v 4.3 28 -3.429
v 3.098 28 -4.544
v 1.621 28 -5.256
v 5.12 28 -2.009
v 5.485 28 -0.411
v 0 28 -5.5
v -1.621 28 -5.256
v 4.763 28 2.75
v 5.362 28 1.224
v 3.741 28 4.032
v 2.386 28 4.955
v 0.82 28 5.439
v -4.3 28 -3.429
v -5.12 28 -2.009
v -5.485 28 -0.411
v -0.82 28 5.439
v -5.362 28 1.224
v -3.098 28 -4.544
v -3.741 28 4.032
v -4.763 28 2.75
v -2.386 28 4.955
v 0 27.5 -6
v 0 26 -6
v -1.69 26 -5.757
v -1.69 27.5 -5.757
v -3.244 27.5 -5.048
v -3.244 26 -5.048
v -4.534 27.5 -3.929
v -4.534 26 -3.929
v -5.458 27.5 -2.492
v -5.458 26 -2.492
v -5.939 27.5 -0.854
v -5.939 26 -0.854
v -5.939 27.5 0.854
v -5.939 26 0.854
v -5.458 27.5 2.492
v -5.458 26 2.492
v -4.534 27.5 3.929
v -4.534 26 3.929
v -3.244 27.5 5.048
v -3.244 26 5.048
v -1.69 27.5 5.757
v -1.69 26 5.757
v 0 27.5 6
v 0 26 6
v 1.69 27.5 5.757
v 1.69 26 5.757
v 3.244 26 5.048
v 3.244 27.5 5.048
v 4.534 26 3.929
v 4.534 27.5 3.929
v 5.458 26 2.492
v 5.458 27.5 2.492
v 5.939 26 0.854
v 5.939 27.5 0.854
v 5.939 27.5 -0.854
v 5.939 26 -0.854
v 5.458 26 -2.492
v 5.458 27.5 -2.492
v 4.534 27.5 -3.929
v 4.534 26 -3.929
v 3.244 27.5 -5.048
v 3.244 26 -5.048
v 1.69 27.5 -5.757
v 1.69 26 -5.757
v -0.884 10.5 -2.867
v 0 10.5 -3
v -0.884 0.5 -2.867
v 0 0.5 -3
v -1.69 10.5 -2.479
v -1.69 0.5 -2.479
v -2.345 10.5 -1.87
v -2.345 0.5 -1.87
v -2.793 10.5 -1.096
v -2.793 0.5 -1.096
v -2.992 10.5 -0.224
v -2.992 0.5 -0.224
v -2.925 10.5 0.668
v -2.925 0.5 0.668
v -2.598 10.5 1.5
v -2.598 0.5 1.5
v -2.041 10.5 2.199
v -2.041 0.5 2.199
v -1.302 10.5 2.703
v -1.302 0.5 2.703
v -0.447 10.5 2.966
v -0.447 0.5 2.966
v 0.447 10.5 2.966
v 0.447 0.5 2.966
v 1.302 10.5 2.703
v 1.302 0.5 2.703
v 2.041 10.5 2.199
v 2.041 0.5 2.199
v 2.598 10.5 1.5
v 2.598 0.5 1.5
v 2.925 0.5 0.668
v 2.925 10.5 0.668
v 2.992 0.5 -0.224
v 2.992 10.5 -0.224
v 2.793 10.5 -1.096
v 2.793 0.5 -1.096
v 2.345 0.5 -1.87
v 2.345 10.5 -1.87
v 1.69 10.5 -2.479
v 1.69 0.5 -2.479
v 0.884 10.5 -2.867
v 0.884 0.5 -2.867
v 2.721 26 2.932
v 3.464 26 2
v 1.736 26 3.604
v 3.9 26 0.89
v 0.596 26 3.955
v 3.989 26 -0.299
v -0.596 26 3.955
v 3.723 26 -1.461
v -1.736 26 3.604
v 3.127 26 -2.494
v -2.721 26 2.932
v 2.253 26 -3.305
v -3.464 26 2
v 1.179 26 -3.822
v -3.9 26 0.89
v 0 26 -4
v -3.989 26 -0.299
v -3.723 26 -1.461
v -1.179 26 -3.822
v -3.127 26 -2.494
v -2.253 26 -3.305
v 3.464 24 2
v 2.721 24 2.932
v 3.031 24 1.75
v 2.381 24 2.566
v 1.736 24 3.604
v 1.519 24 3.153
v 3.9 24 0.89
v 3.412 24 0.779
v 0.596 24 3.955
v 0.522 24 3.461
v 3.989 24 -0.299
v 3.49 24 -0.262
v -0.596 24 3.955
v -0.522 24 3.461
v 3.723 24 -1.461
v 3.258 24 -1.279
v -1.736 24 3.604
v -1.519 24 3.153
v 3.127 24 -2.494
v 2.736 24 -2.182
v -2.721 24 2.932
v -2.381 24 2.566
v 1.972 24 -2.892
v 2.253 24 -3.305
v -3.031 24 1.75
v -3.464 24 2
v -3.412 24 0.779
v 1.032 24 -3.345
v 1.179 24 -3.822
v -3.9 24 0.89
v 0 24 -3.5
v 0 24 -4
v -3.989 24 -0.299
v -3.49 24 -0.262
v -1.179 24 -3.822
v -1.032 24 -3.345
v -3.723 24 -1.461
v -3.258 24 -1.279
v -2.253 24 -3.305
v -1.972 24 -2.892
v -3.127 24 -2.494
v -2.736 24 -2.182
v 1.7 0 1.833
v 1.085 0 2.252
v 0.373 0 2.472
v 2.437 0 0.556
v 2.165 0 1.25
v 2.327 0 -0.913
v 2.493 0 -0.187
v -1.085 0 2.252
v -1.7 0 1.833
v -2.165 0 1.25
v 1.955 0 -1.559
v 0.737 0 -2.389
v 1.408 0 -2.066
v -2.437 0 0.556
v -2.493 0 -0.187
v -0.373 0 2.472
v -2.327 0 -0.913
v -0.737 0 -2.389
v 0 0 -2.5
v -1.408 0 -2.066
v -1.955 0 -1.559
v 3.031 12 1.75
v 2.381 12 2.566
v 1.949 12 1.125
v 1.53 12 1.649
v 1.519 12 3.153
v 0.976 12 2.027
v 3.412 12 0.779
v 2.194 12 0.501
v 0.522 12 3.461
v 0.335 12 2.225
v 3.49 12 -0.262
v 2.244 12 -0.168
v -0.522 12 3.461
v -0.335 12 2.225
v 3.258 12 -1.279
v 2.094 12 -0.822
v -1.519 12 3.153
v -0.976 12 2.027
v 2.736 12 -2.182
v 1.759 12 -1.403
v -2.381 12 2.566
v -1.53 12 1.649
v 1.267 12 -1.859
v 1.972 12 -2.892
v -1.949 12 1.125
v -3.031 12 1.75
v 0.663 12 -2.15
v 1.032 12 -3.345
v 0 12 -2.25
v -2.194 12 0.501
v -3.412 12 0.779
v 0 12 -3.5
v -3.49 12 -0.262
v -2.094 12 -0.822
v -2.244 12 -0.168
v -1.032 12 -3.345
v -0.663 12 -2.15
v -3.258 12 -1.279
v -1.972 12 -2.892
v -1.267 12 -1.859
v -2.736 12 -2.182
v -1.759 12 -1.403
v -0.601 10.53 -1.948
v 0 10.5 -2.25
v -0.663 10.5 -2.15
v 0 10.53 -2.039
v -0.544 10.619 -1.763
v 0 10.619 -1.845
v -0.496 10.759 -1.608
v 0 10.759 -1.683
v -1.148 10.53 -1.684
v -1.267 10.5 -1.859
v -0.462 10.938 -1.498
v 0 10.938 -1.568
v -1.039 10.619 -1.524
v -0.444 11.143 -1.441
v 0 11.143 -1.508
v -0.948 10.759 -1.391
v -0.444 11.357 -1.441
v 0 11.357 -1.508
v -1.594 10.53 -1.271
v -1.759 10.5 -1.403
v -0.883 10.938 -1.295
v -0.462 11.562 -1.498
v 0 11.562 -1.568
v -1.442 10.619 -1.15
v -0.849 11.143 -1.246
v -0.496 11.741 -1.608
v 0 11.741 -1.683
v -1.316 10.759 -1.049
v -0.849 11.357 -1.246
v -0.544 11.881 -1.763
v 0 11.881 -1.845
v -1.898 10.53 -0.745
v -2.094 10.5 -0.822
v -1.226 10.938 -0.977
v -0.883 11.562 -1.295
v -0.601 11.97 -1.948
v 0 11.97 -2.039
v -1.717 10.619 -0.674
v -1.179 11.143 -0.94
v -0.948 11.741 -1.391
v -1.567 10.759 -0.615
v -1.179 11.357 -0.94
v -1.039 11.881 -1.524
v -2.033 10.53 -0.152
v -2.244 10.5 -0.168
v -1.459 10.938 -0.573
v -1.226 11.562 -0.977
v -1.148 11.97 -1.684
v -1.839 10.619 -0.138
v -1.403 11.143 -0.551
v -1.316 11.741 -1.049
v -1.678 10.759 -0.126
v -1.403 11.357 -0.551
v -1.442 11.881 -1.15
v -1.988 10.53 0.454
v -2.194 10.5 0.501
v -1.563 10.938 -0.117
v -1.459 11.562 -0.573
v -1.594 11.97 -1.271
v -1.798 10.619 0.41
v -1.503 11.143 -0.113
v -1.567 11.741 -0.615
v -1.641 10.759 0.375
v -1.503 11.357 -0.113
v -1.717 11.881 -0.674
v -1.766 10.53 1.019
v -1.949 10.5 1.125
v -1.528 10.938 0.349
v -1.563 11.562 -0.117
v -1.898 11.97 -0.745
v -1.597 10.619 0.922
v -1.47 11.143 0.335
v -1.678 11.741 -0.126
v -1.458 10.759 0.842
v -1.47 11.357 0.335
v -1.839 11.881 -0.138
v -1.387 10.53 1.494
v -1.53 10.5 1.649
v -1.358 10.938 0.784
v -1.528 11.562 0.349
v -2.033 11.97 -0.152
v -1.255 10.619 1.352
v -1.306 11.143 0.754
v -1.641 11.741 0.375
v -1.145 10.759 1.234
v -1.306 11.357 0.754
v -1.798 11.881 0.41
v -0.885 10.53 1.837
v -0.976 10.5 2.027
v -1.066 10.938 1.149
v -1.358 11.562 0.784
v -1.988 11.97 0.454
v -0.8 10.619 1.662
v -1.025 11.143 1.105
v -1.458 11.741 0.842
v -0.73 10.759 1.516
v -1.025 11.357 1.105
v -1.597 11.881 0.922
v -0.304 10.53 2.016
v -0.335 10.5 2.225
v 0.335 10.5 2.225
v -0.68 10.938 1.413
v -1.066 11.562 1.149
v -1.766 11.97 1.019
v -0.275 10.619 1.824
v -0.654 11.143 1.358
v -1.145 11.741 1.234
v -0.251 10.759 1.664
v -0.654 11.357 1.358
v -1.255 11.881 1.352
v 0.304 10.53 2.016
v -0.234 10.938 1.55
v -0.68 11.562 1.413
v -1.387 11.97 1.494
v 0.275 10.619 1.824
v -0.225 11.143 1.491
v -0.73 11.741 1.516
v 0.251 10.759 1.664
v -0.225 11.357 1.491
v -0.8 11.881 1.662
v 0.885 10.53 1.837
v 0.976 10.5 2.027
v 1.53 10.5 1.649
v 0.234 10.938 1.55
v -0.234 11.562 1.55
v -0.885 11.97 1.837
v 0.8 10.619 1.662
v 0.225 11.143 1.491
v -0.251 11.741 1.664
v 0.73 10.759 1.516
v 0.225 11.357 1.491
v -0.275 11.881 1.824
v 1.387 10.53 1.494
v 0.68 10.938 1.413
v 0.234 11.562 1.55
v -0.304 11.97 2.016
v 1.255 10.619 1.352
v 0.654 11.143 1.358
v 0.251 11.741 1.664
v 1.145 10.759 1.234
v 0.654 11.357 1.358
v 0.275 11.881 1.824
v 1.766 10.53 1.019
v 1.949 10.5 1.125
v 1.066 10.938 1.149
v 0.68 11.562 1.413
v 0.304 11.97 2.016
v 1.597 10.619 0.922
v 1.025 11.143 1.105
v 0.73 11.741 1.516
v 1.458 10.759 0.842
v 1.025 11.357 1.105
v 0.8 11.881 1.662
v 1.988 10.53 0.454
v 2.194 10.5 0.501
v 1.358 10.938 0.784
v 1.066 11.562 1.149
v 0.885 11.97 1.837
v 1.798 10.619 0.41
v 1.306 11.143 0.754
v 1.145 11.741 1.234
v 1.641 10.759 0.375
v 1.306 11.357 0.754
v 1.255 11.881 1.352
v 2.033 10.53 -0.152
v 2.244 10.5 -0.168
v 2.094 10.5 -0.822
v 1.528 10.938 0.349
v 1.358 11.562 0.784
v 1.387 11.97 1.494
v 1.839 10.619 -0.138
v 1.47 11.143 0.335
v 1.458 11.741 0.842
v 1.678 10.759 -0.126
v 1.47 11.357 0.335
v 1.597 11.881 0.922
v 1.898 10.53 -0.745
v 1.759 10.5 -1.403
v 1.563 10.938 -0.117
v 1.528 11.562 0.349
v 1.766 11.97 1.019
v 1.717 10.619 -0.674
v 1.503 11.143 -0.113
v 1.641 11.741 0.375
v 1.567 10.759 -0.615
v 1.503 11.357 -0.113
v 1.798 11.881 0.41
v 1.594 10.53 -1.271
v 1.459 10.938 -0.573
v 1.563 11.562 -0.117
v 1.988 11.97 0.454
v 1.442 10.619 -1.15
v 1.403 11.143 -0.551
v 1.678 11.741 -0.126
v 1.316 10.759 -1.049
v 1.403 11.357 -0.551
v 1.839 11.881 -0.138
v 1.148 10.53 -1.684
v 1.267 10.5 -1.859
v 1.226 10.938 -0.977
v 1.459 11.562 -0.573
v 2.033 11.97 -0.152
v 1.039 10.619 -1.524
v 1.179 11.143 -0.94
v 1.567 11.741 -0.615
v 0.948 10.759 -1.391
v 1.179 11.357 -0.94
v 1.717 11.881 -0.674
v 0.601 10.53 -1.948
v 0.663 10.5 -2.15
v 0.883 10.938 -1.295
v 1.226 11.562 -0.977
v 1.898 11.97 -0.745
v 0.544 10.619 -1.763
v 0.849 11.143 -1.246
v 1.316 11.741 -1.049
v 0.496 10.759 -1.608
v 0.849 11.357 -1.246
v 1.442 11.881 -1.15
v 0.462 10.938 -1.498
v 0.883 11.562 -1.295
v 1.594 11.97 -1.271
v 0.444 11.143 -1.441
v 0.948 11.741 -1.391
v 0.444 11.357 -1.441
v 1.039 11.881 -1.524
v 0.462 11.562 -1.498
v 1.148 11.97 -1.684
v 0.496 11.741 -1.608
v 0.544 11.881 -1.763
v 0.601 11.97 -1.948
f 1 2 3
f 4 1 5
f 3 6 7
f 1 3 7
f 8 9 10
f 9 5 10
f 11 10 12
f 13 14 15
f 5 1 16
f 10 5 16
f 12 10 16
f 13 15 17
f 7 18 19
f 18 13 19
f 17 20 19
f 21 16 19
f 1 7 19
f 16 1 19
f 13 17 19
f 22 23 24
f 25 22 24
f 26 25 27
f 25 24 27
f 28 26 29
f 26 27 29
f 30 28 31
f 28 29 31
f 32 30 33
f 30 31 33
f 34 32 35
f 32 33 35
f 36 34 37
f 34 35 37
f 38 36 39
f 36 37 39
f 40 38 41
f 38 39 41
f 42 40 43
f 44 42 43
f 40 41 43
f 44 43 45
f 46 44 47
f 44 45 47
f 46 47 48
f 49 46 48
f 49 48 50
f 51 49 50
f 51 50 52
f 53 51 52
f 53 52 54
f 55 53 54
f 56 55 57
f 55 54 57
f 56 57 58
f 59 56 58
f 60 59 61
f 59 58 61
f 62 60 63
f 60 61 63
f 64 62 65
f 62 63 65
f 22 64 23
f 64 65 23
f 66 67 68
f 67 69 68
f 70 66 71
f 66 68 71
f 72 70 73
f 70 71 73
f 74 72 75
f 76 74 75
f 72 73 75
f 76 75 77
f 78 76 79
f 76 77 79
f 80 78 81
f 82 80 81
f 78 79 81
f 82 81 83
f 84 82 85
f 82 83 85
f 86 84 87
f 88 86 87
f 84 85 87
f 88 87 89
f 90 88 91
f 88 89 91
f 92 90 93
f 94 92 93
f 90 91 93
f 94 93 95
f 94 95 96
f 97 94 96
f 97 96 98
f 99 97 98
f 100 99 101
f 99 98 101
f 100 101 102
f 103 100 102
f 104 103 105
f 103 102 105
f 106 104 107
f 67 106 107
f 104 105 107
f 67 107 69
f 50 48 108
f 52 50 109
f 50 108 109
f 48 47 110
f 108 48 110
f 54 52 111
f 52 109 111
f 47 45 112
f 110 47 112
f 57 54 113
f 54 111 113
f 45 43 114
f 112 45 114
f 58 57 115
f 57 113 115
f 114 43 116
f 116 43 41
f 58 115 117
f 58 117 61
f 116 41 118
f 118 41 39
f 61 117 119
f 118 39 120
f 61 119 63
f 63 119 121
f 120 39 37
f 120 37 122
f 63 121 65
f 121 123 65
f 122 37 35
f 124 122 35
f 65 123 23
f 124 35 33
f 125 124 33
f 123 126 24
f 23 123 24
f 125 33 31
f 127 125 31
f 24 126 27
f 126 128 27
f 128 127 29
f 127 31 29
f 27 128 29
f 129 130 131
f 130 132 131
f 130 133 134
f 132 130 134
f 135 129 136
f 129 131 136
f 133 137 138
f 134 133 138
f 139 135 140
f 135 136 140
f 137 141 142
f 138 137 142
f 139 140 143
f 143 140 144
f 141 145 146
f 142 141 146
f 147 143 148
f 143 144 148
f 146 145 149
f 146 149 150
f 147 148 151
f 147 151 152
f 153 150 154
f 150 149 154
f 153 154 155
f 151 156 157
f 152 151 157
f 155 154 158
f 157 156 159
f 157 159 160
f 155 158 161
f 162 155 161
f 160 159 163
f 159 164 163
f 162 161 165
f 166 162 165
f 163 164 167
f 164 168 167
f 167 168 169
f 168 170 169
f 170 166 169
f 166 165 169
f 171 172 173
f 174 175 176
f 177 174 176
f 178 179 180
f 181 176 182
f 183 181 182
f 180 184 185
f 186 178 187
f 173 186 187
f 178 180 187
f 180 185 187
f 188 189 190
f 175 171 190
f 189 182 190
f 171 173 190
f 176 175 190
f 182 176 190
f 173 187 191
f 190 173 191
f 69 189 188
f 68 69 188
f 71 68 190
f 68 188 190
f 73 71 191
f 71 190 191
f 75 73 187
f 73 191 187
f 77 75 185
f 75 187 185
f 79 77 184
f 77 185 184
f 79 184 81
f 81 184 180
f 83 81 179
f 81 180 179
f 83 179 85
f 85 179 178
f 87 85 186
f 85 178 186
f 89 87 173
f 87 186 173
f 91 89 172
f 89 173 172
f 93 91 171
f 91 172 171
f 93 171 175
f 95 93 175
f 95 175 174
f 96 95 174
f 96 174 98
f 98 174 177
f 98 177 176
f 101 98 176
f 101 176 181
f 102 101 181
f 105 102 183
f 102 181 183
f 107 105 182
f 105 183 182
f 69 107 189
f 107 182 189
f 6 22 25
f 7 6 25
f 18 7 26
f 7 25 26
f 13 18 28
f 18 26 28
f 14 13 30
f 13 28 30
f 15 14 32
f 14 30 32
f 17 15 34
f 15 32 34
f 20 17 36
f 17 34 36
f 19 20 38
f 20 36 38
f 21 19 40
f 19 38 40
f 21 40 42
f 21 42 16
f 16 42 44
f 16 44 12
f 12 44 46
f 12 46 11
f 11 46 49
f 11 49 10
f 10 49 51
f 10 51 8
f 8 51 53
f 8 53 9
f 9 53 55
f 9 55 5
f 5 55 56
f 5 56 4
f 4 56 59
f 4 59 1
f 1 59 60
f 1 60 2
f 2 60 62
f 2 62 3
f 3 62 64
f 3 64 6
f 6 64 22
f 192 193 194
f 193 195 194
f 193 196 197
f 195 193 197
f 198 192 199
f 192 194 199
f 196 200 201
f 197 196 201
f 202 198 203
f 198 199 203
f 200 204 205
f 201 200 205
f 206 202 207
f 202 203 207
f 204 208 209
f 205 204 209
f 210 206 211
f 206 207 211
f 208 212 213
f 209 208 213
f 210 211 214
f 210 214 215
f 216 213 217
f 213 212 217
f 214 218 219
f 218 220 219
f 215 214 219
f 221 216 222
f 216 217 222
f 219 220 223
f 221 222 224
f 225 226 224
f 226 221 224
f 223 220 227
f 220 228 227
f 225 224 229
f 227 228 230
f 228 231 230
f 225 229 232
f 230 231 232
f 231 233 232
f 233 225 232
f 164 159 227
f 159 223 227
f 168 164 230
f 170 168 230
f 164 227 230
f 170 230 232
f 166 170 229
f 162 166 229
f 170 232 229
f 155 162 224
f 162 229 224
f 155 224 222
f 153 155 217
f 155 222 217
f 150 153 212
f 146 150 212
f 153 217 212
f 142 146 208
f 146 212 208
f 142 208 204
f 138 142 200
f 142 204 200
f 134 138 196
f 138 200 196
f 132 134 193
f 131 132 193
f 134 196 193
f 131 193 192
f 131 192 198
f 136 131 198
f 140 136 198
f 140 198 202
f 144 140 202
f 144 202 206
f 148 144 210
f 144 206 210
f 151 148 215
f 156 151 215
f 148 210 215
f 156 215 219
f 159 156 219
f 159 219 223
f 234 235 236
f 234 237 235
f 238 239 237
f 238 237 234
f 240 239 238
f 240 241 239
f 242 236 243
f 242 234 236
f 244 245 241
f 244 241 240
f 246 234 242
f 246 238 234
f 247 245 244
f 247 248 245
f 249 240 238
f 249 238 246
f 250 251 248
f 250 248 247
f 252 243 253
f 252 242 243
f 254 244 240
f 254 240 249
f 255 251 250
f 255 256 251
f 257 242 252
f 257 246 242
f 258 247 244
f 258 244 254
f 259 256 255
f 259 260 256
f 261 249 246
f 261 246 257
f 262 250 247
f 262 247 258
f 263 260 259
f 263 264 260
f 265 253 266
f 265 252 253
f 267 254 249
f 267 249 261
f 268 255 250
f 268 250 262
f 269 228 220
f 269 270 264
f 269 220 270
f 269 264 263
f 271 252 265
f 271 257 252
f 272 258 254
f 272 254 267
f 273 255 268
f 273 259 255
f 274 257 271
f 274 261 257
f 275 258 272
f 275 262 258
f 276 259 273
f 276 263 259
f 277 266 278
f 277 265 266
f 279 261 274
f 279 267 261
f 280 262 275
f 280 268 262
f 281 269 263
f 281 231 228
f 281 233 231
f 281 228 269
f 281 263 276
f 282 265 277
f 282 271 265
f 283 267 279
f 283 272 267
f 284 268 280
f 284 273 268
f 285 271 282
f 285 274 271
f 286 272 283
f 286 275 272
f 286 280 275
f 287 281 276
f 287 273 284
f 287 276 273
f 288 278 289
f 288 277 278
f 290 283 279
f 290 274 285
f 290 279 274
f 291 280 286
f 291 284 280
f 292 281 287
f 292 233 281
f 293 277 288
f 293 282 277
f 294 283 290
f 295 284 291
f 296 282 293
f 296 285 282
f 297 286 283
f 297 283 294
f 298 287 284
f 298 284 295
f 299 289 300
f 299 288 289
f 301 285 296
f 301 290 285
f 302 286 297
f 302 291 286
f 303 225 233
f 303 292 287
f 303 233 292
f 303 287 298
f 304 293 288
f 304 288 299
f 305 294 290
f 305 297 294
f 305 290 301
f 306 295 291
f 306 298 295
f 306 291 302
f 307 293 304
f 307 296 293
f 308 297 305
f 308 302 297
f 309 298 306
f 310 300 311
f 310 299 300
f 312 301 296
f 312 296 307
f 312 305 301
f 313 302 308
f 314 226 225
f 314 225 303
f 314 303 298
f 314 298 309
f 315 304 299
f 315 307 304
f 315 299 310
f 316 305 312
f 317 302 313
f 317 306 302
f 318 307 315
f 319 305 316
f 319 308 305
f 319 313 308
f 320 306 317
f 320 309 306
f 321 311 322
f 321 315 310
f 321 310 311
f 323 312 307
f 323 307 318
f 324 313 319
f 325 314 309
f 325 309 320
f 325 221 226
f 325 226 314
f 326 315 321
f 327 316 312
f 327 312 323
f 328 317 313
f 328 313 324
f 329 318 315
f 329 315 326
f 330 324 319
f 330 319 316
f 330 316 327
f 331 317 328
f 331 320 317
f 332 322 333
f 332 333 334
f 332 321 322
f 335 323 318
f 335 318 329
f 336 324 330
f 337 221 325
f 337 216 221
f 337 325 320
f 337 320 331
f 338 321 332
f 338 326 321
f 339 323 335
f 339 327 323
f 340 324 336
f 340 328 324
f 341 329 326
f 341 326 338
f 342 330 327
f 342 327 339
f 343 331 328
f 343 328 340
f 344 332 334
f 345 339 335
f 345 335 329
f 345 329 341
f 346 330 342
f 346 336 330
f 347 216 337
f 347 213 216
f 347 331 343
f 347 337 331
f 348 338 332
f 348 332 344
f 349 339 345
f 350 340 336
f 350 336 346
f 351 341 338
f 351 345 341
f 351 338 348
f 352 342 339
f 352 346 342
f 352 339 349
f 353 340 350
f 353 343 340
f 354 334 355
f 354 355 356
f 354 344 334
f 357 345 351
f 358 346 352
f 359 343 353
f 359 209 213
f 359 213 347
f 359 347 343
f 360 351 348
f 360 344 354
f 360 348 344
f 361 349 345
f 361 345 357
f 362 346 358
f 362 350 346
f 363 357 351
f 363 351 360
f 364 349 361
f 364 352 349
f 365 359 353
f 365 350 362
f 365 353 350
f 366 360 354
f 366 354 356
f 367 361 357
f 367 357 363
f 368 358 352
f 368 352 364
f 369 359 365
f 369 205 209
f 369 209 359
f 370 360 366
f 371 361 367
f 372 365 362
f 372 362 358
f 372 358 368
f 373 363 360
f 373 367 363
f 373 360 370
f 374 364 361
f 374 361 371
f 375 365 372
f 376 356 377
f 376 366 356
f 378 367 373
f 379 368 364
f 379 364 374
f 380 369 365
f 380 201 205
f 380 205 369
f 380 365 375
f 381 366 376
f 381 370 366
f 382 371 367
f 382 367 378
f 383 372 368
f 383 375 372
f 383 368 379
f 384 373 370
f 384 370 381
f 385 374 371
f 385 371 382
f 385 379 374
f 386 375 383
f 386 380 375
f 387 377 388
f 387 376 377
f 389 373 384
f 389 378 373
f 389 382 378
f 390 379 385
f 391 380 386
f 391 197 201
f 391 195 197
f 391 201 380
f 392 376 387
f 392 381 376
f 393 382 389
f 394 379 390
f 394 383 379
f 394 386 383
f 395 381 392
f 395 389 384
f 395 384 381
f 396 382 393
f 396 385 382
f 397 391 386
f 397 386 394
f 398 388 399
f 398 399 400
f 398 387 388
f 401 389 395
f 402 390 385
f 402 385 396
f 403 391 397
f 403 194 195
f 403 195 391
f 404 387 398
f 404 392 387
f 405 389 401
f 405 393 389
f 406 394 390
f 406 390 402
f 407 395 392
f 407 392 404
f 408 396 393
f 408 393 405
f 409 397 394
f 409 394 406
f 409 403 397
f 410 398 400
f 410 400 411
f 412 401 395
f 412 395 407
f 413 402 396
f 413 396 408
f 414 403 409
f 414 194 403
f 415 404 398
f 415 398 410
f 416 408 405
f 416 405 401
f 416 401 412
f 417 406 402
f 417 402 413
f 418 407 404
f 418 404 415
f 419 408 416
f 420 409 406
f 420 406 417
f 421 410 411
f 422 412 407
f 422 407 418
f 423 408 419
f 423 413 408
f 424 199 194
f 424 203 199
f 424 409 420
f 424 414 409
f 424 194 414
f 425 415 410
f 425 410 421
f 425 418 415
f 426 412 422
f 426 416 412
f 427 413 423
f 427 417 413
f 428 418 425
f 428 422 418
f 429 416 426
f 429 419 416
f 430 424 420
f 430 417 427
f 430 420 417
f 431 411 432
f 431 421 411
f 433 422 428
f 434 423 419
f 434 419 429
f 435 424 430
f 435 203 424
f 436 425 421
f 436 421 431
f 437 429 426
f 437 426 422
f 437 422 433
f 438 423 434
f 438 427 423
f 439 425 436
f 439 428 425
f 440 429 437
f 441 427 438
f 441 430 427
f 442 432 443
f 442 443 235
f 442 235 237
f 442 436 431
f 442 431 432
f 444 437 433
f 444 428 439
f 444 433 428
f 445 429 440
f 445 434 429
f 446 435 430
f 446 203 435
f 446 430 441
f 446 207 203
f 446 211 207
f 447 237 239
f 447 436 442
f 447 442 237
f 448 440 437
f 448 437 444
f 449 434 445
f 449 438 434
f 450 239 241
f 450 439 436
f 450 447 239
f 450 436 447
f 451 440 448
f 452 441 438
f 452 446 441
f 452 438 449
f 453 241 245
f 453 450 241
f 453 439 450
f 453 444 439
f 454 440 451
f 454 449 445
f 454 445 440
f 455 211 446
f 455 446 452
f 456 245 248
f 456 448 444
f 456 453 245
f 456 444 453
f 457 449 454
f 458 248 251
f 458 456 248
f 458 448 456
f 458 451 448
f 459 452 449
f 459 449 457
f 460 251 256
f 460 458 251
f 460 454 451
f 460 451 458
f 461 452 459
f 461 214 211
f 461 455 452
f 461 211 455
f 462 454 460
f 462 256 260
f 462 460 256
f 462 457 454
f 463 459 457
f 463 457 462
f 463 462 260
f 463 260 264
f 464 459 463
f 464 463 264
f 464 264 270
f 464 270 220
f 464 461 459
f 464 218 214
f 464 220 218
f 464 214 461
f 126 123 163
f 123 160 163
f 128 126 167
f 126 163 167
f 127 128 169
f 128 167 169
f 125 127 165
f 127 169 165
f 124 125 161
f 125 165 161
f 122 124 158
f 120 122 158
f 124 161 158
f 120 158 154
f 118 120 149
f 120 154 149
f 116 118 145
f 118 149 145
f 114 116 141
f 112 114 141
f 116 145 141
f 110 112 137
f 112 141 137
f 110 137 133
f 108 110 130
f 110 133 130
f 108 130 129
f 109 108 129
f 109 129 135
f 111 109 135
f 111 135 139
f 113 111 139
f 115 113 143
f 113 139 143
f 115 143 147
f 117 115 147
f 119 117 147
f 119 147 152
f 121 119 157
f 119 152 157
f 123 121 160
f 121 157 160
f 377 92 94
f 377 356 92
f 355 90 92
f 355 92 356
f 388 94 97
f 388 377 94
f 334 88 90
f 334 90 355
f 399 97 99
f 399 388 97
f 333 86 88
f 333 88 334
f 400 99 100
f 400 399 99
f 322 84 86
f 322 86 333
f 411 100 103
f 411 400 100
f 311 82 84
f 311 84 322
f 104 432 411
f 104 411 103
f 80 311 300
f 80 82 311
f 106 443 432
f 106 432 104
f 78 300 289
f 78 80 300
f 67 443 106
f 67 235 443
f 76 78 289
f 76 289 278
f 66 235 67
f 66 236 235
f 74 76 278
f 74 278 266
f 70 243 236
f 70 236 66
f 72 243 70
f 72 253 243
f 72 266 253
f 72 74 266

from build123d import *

# Parameters (mm, degrees)
CHANFREIN1_SIZE = 0.5


with BuildPart() as part:
    # Esquisse1 → Base-Révolution (revolve)
    with BuildSketch(Plane.XY, mode=Mode.PRIVATE) as base_r_volution_sk:
        Polygon((0, 28), (6, 28), (6, 26), (4, 26), (4, 24), (3.5, 24), (3.5, 12), (3, 12), (3, 0), (0, 0), align=None)
    revolve(base_r_volution_sk.sketch.rotate(Axis((0, 0, 0), (0, 1, 0)), 90), axis=Axis((0, 0, 0), (0, 1, 0)))

    # Chanfrein1
    chanfrein1_edges = [part.edges().sort_by_distance(p)[0] for p in [
        (0, 28, 6),
        (0, 0, 3),
    ]]
    chamfer(chanfrein1_edges, length=CHANFREIN1_SIZE)

    # Esquisse3 → Enlever de la matière-Révolution1 (revolve, cut)
    with BuildSketch(Plane(origin=(0, 0, 0), x_dir=(0, 0, -1), z_dir=(1, 0, 0))):
        with BuildLine():
            Line((2.25, 12), (3, 12))
            Line((3, 12), (3, 10.5))
            Line((3, 10.5), (2.25, 10.5))
            ThreePointArc((2.25, 10.5), (1.5, 11.25), (2.25, 12))
        make_face()
    revolve(axis=Axis((0, 0, 0), (0, 1, 0)), mode=Mode.SUBTRACT)


solid = part.part
